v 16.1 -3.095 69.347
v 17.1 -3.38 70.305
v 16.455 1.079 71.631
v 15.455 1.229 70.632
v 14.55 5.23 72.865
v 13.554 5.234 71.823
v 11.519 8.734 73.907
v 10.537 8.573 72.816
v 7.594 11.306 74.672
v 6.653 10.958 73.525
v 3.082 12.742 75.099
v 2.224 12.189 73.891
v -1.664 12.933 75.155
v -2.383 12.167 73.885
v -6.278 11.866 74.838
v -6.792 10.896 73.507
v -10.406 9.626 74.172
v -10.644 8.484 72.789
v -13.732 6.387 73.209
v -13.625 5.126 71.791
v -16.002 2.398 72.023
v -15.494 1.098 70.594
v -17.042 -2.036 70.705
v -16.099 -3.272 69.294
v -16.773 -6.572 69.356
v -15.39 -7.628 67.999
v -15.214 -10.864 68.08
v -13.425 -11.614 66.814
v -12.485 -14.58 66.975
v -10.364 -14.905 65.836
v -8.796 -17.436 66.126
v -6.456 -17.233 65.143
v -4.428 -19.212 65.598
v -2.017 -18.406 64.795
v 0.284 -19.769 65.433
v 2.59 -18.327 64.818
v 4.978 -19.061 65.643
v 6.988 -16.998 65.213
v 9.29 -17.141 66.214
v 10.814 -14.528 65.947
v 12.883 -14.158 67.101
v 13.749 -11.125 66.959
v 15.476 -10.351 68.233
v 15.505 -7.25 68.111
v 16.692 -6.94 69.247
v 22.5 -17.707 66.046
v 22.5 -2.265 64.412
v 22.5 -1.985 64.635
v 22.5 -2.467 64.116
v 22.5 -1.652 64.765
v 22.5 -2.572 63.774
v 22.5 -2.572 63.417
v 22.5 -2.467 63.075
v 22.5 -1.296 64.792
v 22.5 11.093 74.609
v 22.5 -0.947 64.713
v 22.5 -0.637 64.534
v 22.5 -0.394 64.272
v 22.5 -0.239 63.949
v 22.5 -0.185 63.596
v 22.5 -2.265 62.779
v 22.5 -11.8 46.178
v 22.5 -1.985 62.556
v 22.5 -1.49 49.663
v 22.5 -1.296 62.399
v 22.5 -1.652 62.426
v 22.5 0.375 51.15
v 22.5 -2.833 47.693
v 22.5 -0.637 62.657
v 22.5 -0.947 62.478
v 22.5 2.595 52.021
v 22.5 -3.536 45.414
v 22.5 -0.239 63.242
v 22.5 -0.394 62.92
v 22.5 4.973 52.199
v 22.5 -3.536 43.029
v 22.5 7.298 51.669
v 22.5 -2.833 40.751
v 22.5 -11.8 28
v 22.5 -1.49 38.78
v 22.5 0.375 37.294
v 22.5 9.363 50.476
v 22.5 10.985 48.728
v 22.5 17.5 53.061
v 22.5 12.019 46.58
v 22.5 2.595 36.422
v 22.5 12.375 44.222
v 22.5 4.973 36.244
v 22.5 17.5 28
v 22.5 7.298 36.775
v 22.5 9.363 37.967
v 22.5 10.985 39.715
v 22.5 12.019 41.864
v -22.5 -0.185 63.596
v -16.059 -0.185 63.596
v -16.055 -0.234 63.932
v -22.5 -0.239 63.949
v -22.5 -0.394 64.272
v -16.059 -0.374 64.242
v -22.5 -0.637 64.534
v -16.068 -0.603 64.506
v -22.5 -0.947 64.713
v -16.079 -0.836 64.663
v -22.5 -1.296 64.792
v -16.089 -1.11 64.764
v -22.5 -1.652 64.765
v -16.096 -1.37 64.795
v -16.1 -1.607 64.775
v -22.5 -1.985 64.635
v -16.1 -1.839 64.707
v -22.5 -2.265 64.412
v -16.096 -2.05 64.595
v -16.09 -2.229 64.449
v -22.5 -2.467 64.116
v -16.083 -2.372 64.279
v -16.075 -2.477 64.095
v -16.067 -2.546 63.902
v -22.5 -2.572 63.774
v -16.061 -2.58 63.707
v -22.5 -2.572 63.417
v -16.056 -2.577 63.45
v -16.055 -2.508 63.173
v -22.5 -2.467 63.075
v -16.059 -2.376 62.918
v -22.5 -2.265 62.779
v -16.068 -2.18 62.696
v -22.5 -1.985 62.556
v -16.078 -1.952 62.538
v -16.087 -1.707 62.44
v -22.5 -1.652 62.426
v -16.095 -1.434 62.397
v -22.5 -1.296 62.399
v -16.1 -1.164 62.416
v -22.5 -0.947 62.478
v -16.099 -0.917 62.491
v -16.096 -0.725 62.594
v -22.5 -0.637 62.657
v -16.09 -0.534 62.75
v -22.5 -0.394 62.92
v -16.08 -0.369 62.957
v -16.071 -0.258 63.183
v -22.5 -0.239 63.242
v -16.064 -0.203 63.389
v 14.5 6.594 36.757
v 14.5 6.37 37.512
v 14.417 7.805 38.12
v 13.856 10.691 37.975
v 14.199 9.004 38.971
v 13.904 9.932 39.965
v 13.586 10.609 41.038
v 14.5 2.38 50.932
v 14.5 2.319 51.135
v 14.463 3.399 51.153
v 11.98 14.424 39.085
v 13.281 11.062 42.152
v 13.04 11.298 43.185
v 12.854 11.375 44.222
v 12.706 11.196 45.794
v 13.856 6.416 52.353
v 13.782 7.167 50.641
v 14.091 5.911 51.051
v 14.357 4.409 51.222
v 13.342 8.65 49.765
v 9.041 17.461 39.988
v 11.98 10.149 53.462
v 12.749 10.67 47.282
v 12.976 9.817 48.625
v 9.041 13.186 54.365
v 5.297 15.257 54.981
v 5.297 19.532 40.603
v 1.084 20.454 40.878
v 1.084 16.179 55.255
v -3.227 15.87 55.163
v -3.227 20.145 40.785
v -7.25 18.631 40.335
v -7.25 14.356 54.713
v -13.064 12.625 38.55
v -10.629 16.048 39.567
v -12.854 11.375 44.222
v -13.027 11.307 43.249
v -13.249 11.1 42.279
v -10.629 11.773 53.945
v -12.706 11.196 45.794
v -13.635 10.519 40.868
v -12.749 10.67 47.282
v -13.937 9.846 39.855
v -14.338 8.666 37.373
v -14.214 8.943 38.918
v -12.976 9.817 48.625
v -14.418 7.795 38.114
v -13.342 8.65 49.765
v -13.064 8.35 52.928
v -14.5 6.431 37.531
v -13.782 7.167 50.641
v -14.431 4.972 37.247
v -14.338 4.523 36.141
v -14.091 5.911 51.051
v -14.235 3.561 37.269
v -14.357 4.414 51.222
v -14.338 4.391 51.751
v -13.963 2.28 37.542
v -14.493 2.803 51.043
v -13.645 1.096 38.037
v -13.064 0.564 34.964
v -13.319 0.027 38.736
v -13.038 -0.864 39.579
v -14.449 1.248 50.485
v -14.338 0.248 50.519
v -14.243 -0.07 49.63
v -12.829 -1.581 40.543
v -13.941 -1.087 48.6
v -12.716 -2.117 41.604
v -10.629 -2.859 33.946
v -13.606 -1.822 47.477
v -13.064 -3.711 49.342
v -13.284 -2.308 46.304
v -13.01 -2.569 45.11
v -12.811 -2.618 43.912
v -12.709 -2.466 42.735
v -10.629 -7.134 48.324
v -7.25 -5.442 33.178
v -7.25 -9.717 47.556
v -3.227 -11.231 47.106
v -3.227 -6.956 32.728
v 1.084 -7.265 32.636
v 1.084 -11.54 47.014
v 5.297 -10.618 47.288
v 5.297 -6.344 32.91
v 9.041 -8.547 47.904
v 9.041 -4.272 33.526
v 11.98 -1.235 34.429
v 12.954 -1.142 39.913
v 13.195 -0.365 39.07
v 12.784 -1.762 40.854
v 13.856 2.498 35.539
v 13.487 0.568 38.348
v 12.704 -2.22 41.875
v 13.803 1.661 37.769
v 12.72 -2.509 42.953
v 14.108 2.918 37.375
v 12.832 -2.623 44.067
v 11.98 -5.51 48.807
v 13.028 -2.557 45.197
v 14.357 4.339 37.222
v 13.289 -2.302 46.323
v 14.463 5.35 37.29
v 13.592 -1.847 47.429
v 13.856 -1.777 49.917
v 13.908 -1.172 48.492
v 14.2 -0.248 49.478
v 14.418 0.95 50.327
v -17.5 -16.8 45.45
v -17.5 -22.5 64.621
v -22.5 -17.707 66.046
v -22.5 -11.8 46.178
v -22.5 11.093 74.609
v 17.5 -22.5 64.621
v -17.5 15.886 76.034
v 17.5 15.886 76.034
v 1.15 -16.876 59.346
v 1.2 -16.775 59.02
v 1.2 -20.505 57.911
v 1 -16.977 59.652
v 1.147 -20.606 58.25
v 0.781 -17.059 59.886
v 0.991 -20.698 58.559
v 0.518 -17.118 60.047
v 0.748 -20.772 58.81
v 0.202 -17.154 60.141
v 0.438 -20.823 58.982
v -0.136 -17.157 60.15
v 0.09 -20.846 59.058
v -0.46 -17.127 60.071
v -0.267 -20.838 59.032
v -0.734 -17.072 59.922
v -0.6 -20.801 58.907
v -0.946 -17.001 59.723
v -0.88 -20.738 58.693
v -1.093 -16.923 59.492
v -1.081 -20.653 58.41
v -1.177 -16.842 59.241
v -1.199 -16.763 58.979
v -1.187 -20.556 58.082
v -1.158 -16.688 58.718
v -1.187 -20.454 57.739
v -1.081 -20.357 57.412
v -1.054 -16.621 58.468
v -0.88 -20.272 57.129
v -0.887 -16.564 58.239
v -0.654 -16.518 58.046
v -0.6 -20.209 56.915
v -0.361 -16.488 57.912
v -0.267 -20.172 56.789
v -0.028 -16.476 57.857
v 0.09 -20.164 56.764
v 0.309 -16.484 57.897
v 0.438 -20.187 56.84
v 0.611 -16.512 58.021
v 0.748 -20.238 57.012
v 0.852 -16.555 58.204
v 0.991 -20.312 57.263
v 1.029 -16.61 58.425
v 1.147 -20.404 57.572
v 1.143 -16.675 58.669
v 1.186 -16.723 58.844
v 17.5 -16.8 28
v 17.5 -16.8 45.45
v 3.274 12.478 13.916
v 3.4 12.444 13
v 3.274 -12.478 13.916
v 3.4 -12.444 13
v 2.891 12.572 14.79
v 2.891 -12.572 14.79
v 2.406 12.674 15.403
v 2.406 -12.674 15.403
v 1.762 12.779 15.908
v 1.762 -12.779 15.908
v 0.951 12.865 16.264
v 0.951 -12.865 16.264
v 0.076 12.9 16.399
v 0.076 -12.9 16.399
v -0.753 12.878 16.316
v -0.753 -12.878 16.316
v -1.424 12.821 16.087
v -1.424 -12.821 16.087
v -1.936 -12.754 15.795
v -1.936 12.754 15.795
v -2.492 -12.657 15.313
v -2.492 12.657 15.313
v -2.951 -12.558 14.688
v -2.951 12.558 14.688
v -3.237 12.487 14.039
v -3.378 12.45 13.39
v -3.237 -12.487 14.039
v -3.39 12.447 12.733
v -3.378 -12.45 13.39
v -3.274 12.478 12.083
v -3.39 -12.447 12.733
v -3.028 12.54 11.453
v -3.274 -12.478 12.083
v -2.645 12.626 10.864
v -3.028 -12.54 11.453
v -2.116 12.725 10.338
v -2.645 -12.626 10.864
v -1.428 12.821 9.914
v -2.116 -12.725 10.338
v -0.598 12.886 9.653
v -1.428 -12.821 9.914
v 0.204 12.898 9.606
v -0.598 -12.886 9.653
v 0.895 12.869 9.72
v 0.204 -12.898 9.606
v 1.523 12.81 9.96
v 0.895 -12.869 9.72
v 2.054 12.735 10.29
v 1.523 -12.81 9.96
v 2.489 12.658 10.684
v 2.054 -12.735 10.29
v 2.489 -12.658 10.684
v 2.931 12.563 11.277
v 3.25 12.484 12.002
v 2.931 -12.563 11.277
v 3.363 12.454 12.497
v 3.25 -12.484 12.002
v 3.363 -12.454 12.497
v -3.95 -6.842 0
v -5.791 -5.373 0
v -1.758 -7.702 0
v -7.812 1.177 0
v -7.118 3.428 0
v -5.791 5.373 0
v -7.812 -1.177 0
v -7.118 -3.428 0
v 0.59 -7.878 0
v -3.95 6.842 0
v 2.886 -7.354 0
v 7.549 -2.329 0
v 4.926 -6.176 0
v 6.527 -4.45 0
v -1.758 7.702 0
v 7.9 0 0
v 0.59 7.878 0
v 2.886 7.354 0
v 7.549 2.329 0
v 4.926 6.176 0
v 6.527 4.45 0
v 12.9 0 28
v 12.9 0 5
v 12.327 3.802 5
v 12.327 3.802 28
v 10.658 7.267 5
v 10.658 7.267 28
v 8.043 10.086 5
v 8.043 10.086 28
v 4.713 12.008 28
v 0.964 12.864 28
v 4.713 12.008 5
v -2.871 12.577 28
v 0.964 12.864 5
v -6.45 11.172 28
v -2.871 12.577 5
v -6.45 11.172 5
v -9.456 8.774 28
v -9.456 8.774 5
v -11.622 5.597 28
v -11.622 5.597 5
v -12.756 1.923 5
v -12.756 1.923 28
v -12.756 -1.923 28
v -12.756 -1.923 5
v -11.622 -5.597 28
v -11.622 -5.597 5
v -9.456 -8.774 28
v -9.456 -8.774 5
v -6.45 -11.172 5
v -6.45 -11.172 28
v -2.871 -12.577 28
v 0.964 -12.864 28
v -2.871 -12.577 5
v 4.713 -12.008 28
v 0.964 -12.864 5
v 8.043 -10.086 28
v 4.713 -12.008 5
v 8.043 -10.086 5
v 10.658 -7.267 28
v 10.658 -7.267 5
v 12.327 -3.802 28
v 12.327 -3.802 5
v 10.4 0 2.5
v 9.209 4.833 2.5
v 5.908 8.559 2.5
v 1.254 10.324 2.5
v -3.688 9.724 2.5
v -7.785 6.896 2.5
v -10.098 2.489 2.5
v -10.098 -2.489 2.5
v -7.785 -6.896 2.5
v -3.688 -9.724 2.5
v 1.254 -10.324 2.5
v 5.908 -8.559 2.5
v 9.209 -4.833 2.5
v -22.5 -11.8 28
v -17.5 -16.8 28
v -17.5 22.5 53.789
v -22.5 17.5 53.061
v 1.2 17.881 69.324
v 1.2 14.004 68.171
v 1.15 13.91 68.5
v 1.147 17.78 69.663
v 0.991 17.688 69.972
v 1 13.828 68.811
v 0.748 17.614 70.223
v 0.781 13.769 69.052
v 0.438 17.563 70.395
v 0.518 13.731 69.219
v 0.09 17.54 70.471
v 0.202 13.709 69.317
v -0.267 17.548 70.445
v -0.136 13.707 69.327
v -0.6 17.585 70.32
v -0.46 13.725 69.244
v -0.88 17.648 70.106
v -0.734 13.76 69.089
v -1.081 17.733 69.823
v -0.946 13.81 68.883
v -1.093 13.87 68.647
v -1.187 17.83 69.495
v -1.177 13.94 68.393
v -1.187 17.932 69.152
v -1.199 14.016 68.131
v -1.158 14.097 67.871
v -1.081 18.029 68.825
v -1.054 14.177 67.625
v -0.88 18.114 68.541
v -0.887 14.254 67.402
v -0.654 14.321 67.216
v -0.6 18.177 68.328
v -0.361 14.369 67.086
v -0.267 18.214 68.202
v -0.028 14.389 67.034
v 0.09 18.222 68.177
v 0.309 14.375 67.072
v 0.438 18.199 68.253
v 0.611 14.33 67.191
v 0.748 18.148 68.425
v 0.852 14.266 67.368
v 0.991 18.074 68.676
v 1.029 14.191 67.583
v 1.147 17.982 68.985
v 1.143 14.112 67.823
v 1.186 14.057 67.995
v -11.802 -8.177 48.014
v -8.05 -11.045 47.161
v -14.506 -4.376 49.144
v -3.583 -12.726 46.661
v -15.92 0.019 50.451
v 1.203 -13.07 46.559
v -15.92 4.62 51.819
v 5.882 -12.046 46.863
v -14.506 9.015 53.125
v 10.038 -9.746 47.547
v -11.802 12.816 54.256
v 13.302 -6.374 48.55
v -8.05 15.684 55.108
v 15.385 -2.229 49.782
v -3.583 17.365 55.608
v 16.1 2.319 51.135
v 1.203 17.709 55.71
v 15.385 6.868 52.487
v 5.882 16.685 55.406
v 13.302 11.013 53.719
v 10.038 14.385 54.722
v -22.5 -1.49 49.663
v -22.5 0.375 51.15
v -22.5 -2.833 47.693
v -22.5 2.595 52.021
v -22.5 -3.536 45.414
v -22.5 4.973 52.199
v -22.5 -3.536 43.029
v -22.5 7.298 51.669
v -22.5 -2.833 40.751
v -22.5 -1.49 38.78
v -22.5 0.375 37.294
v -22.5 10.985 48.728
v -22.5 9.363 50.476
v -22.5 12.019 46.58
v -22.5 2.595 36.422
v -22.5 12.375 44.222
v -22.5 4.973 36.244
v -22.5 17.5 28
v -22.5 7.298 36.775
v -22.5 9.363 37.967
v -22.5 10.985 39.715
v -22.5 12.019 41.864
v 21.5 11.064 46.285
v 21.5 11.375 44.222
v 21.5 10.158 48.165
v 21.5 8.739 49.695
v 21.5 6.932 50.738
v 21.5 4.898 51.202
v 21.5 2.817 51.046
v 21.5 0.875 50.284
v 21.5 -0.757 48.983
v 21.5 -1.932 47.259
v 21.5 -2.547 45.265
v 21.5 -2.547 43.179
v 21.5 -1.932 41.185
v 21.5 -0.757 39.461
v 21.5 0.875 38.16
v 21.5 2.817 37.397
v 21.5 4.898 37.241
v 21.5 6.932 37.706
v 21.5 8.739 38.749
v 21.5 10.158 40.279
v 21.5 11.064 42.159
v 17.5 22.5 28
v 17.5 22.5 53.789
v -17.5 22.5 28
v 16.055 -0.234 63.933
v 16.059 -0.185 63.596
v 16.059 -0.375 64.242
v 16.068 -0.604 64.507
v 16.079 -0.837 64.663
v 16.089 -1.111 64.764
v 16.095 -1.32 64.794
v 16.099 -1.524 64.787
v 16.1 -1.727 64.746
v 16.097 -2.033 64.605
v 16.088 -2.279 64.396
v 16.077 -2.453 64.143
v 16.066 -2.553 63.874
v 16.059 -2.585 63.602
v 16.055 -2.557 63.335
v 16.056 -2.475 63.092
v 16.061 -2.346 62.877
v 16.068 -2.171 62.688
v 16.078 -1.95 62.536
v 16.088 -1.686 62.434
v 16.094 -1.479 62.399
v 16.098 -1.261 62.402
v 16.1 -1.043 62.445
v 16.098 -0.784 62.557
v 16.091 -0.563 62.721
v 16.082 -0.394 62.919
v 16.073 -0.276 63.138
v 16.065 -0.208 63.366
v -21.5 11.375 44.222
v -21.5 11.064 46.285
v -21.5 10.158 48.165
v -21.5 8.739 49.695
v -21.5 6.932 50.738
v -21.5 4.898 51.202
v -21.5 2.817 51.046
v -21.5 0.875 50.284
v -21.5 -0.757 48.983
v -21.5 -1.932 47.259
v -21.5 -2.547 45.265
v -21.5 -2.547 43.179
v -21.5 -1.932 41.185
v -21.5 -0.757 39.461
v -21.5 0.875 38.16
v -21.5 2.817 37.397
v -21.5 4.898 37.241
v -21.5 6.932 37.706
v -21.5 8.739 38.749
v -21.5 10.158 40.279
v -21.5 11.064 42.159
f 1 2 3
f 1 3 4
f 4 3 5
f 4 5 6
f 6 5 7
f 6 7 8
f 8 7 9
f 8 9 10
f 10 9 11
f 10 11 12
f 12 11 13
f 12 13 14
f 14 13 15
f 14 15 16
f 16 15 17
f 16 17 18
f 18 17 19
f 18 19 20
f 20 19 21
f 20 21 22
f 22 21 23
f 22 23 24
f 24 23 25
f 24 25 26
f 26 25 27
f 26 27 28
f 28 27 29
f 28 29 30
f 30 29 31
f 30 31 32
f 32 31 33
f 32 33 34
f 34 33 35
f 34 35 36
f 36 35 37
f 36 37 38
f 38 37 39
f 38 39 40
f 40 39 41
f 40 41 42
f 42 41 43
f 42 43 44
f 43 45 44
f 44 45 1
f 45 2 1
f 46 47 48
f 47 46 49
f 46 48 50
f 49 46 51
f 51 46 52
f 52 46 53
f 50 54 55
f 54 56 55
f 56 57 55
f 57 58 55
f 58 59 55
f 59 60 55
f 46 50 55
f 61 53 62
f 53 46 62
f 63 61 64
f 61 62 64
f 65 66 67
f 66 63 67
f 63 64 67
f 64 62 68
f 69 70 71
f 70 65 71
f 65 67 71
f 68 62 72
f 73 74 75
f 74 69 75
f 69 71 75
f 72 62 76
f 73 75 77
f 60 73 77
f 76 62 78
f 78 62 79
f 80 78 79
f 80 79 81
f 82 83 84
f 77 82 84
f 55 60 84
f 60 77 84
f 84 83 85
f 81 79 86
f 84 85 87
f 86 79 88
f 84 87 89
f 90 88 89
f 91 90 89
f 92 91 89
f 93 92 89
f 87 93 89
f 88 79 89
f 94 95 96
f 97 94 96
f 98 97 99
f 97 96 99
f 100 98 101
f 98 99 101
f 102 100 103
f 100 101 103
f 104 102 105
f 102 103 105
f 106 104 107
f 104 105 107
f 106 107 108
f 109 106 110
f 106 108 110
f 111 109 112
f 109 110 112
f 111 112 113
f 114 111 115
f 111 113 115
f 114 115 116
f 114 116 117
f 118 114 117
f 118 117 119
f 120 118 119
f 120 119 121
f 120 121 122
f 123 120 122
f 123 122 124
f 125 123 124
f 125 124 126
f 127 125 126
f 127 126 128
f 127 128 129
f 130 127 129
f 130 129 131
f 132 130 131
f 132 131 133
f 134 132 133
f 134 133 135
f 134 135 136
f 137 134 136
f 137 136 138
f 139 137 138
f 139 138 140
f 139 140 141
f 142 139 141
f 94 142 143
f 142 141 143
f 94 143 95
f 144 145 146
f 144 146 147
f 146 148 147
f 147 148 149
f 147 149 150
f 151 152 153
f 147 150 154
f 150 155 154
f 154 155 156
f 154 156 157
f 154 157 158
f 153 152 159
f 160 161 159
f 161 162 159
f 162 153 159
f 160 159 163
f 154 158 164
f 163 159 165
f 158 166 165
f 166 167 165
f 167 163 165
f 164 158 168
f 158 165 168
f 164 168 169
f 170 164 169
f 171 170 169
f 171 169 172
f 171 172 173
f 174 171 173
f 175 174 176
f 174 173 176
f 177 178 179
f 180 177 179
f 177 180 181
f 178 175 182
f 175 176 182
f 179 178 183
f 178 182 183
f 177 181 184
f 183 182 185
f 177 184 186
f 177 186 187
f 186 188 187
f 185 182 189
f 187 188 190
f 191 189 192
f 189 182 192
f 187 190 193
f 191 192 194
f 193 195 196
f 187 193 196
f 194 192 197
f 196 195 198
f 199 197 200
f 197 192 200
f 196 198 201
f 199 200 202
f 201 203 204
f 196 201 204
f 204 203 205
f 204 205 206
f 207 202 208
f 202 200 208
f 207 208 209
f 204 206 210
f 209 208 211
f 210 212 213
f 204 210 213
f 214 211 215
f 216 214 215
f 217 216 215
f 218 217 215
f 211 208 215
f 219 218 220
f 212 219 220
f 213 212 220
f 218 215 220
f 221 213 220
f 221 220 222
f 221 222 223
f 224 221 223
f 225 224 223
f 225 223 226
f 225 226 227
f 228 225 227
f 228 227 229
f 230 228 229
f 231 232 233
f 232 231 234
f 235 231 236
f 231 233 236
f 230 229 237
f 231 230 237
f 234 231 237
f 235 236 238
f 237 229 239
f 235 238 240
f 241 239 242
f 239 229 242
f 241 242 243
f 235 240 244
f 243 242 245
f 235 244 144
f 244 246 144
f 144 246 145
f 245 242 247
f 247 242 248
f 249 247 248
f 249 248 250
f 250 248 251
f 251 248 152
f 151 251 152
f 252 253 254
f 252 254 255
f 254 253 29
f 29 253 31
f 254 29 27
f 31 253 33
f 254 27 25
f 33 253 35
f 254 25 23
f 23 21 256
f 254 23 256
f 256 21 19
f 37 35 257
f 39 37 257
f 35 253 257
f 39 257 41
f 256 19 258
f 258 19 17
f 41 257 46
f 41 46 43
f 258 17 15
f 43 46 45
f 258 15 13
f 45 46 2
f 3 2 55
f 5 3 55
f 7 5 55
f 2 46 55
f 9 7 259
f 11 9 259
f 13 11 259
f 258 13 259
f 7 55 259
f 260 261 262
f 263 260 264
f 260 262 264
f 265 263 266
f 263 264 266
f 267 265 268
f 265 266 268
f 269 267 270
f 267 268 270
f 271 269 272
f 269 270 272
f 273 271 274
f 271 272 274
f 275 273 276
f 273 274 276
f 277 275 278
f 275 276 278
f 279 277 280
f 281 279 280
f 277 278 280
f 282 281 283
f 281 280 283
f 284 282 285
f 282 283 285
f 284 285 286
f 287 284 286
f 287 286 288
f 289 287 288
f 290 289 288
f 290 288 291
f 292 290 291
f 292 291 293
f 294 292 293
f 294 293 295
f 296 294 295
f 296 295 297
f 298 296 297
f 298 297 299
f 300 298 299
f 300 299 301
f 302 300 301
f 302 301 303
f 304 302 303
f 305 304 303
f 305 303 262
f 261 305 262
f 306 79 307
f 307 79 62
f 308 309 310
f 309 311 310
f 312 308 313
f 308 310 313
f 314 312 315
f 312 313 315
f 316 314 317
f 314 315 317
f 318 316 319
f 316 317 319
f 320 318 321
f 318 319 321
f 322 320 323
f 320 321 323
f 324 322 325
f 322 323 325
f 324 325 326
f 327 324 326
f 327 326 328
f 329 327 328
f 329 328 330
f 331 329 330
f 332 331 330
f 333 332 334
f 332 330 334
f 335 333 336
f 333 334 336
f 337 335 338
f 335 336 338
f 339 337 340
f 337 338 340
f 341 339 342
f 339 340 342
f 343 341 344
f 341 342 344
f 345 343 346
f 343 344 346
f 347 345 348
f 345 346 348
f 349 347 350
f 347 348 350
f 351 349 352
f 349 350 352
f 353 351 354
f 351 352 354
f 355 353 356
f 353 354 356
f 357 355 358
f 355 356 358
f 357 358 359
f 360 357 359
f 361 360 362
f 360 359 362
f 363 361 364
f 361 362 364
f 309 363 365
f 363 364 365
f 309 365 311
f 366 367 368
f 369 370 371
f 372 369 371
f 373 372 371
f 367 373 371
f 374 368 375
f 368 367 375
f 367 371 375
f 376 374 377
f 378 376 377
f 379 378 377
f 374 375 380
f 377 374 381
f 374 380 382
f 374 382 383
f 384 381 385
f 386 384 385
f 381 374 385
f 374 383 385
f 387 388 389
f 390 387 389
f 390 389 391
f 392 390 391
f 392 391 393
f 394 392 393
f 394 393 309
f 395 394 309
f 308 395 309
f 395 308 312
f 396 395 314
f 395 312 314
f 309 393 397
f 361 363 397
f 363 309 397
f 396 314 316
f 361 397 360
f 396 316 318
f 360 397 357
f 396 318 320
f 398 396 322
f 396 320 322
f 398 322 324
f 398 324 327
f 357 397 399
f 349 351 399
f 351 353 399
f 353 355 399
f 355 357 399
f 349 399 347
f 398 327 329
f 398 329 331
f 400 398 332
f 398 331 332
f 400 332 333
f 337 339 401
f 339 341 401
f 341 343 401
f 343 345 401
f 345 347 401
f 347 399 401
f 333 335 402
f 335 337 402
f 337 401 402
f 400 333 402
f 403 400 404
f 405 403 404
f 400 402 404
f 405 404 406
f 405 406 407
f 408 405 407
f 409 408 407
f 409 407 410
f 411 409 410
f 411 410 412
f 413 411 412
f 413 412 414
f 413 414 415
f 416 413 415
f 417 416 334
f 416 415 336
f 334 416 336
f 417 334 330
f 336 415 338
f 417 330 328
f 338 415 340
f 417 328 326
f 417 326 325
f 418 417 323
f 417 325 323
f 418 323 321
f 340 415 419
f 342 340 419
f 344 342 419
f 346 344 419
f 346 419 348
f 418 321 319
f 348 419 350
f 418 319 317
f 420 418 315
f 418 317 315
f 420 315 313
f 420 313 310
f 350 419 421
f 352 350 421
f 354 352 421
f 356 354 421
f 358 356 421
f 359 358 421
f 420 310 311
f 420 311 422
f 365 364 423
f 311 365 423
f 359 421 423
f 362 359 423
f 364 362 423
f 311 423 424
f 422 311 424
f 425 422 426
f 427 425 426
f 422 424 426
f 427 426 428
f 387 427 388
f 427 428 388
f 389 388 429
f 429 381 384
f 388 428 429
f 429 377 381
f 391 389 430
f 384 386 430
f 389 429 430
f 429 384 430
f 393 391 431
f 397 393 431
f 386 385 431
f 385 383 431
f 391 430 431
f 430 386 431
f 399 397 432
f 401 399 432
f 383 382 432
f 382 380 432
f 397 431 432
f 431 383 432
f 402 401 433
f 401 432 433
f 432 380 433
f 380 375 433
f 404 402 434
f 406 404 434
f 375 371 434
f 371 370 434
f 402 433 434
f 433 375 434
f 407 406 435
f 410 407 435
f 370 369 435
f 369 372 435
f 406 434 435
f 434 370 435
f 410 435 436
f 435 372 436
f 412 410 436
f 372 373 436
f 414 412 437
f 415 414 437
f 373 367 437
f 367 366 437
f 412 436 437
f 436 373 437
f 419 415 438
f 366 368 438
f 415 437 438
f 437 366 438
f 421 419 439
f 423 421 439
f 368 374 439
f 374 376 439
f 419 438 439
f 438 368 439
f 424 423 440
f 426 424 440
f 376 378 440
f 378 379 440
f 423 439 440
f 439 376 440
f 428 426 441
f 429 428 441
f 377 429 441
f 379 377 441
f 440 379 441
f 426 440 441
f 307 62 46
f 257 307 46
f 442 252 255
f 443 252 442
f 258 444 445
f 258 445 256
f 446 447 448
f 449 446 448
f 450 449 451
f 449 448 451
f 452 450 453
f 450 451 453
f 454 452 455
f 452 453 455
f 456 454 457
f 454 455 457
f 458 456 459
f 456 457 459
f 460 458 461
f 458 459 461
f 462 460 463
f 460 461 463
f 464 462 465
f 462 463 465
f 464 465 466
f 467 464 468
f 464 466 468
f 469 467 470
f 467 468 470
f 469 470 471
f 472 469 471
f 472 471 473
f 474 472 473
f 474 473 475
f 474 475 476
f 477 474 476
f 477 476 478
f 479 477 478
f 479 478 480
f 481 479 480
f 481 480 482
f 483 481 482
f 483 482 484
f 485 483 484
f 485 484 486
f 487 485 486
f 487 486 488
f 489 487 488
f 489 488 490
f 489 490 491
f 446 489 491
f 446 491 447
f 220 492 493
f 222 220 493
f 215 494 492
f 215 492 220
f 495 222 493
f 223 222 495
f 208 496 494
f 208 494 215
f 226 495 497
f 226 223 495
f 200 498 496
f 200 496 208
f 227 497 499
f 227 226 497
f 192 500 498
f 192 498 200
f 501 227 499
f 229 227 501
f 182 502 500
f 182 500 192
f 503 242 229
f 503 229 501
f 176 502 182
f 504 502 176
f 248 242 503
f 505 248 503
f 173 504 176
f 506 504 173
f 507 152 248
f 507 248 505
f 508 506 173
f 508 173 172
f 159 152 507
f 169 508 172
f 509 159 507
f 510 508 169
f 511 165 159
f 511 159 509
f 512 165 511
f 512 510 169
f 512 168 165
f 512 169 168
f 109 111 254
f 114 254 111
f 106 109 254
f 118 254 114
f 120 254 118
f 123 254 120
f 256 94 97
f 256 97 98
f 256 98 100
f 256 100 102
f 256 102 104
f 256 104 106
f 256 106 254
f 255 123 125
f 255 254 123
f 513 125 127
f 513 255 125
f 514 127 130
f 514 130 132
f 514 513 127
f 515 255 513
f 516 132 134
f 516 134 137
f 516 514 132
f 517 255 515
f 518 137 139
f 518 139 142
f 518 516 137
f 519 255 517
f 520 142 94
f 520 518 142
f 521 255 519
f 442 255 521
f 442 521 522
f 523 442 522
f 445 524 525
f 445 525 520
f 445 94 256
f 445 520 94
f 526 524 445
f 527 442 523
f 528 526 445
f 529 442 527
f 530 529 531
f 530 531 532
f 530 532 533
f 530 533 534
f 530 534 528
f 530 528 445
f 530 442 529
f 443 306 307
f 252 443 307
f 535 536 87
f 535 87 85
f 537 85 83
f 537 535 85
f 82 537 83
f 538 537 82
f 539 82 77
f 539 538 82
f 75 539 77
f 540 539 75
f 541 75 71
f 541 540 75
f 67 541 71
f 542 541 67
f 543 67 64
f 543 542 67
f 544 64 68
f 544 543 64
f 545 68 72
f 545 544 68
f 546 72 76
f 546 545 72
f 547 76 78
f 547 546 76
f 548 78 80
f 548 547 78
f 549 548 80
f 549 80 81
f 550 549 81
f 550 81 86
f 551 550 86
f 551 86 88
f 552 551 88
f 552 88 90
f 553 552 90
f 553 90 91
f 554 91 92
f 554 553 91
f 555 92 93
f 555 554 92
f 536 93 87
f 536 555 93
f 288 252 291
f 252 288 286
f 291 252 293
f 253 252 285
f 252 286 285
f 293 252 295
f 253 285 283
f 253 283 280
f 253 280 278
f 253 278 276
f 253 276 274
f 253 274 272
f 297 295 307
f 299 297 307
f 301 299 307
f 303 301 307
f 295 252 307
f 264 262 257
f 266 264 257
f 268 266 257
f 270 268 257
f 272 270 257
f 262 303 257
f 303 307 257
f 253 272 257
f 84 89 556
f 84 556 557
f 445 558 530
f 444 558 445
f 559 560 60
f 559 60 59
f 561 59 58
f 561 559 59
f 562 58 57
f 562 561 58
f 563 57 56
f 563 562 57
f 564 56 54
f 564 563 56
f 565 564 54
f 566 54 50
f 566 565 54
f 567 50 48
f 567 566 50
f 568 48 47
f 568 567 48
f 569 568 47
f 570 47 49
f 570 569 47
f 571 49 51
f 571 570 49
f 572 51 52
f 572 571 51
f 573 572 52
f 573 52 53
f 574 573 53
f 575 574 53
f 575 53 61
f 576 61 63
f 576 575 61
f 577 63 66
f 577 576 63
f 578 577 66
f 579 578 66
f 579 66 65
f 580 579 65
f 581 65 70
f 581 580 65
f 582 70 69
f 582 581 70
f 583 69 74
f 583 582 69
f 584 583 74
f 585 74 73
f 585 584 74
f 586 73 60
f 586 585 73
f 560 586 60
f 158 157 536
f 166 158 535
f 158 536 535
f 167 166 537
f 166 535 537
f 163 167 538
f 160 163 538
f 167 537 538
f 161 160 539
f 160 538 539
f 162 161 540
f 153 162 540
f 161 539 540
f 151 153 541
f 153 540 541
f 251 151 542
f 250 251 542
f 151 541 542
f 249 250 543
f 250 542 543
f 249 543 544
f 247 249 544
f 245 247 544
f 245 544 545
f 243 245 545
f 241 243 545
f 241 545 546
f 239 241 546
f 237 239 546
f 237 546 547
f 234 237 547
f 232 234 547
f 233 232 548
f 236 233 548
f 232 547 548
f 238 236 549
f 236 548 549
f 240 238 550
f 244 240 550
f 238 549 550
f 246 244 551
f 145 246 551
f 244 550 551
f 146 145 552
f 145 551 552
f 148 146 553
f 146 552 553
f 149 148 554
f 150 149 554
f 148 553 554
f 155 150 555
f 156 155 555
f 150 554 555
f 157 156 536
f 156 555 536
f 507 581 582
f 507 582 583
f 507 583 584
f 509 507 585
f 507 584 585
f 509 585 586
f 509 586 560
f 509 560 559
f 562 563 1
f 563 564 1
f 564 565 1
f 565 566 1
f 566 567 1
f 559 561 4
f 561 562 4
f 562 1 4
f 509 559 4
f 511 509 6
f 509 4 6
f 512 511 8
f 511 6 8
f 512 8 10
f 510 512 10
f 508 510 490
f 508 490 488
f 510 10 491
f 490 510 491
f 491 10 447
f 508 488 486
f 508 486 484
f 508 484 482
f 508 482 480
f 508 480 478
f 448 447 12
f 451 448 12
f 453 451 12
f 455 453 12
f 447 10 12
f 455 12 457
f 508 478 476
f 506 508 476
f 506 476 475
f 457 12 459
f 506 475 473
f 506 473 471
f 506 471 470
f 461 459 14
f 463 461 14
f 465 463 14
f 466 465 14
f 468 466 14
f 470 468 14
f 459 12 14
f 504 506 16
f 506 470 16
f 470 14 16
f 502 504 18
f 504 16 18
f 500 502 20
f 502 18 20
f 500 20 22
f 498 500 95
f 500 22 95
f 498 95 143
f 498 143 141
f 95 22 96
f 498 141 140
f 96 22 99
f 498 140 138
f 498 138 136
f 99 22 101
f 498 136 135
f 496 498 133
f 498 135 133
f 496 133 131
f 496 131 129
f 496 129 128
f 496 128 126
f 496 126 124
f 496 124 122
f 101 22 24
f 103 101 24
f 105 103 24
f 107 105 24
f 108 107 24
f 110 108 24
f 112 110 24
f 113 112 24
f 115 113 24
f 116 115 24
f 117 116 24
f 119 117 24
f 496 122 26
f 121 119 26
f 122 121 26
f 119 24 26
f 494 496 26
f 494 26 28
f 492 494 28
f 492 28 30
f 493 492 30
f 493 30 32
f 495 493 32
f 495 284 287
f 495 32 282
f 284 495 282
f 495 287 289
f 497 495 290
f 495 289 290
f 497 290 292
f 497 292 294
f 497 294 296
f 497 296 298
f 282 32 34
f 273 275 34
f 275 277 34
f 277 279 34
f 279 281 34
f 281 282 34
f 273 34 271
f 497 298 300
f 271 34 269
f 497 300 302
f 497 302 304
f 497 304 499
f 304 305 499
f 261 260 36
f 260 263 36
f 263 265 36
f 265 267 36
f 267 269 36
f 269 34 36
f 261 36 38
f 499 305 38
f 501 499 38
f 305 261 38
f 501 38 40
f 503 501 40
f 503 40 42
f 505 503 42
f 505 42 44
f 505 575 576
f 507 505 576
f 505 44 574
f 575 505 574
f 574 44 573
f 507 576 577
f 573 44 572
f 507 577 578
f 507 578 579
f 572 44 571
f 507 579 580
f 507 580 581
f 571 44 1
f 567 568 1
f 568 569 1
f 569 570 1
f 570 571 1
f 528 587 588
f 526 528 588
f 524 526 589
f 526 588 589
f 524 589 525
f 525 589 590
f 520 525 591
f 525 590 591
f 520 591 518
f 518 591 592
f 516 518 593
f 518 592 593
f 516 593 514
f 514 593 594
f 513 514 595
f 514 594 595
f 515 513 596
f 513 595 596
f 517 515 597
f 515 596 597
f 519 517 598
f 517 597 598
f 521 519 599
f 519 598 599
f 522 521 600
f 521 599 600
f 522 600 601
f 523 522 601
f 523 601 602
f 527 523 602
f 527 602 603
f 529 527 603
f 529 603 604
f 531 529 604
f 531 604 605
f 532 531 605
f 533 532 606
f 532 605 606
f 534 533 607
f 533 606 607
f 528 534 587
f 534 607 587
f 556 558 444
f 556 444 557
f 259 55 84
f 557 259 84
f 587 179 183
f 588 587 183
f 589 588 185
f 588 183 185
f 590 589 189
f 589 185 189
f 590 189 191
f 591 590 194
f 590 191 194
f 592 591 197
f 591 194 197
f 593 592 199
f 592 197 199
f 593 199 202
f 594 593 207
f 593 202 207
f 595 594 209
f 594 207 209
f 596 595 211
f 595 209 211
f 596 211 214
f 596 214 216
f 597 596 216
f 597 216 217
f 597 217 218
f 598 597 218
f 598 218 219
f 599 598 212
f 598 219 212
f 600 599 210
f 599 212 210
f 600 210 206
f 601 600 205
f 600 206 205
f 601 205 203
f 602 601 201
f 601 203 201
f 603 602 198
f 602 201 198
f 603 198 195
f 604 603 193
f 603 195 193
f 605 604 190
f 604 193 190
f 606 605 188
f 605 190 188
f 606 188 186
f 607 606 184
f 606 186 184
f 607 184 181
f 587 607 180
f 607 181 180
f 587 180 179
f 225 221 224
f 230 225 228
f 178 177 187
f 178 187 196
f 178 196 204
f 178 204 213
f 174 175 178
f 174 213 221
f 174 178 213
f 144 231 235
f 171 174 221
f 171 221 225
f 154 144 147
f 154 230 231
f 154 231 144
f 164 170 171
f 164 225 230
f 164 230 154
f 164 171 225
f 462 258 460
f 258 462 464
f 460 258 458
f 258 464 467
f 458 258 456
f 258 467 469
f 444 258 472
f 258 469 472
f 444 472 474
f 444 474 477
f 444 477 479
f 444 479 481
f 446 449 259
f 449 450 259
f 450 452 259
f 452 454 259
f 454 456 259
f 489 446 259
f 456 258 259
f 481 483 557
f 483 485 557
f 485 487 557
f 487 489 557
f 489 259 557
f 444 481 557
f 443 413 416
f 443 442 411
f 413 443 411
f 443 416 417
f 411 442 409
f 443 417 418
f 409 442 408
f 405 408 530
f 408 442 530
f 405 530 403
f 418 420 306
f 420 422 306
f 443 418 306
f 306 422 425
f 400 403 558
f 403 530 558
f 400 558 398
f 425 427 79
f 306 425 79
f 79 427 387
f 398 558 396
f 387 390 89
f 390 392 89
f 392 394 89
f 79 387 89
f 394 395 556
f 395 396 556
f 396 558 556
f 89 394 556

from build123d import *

# Parameters (mm, degrees)
F0_R      = 12.9
F1_DEPTH  = 28
F2_W      = 45
F2_H      = 45
F3_DEPTH  = 50
F5_DEPTH  = 45.001
F6_R      = 14.5
F7_DEPTH  = 35
F8_R      = 16.1
F9_DEPTH  = 20
F10_R     = 3.4
F11_DEPTH = 32.8
F12_R     = 1.2
F12_R_2   = 7
F13_DEPTH = 65.2
F15_DEPTH = 45.0010001
F16_R     = 1.2
F17_DEPTH = 46.3874578725
F18_SIZE  = 5
F19_SIZE  = 1


with BuildPart() as f1:
    # F0 (on Top) → F1 (new body)
    with BuildSketch(Plane.XY):
        Circle(F0_R)
    extrude(amount=F1_DEPTH)

    # F2 (on face) → F3 (join)
    with BuildSketch(Plane.XY.offset(28)):
        Rectangle(F2_W, F2_H)
    extrude(amount=F3_DEPTH)

    # F4 (on face) → F5 (cut, through all)
    with BuildSketch(Plane.YZ.offset(22.5)):
        Polygon((-22.5, 78), (-22.5, 64.6205767989), (22.5, 78), align=None)
    extrude(amount=-F5_DEPTH, mode=Mode.SUBTRACT)

    # F6 (on face) → F7 (cut)
    with BuildSketch(Plane(origin=(0, -19.4799905068, 65.5184875785), x_dir=(1, 0, 0), z_dir=(0, -0.2849907161, 0.9585302769))):
        with Locations((0, 16.7962070879)):
            Circle(F6_R)
    extrude(amount=-F7_DEPTH, mode=Mode.SUBTRACT)

    # F8 (on face) → F9 (cut)
    with BuildSketch(Plane(origin=(0, -19.4799905068, 65.5184875785), x_dir=(1, 0, 0), z_dir=(0, -0.2849907161, 0.9585302769))):
        with Locations((0, 16.7962070879)):
            Circle(F8_R)
    extrude(amount=-F9_DEPTH, mode=Mode.SUBTRACT)

    # F10 (on Front) → F11 (cut, symmetric)
    with BuildSketch(Plane.XZ):
        with Locations((0, 13)):
            Circle(F10_R)
    extrude(amount=F11_DEPTH, both=True, mode=Mode.SUBTRACT)

    # F12 (on Right) → F13 (cut, symmetric)
    with BuildSketch(Plane.YZ):
        with Locations((-1.3853824633, 63.5955387264)):
            Circle(F12_R)
        with Locations((4.3748263706, 44.2218038779)):
            Circle(F12_R_2)
    extrude(amount=F13_DEPTH, both=True, mode=Mode.SUBTRACT)

    # F14 (on face) → F15 (cut, through all)
    with BuildSketch(Plane.YZ.offset(22.5)):
        Polygon((-16.8001856775, 45.449971261), (-22.5, 64.6205767989), (-22.5, 43.755299528), align=None)
        Polygon((-16.8001856775, 28), (-16.8001856775, 45.449971261), (-22.5, 43.755299528), (-22.5, 28), align=None)
        Polygon((22.5, 78), (15.8861410894, 76.0335640587), (22.5, 53.7886850006), align=None)
    extrude(amount=-F15_DEPTH, mode=Mode.SUBTRACT)

    # F16 (on face) → F17 (cut, through all)
    with BuildSketch(Plane(origin=(0, -3.0200094932, -0.8979107796), x_dir=(1, 0, 0), z_dir=(0, -0.9585302769, -0.2849907161))):
        with Locations((0, 61.3530704849)):
            Circle(F16_R)
    extrude(amount=-F17_DEPTH, mode=Mode.SUBTRACT)

    # F18
    f18_edges = [f1.edges().sort_by_distance(p)[0] for p in [
        (22.5, -19.650093, 55.035274),
        (22.5, -16.800186, 36.724986),
        (22.5, 19.193071, 64.911125),
        (22.5, 22.5, 40.894343),
        (-22.5, 22.5, 40.894343),
        (-22.5, 19.193071, 64.911125),
        (-22.5, -19.650093, 55.035274),
        (-22.5, -16.800186, 36.724986),
        (-12.9, 0, 0),
    ]]
    chamfer(f18_edges, length=F18_SIZE)

    # F19
    f19_edges = [f1.edges().sort_by_distance(p)[0] for p in [
        (-16.1, -3.380317, 70.305251),
        (22.5, -2.625174, 44.221804),
        (-22.5, -2.625174, 44.221804),
    ]]
    chamfer(f19_edges, length=F19_SIZE)


solid = f1.part
